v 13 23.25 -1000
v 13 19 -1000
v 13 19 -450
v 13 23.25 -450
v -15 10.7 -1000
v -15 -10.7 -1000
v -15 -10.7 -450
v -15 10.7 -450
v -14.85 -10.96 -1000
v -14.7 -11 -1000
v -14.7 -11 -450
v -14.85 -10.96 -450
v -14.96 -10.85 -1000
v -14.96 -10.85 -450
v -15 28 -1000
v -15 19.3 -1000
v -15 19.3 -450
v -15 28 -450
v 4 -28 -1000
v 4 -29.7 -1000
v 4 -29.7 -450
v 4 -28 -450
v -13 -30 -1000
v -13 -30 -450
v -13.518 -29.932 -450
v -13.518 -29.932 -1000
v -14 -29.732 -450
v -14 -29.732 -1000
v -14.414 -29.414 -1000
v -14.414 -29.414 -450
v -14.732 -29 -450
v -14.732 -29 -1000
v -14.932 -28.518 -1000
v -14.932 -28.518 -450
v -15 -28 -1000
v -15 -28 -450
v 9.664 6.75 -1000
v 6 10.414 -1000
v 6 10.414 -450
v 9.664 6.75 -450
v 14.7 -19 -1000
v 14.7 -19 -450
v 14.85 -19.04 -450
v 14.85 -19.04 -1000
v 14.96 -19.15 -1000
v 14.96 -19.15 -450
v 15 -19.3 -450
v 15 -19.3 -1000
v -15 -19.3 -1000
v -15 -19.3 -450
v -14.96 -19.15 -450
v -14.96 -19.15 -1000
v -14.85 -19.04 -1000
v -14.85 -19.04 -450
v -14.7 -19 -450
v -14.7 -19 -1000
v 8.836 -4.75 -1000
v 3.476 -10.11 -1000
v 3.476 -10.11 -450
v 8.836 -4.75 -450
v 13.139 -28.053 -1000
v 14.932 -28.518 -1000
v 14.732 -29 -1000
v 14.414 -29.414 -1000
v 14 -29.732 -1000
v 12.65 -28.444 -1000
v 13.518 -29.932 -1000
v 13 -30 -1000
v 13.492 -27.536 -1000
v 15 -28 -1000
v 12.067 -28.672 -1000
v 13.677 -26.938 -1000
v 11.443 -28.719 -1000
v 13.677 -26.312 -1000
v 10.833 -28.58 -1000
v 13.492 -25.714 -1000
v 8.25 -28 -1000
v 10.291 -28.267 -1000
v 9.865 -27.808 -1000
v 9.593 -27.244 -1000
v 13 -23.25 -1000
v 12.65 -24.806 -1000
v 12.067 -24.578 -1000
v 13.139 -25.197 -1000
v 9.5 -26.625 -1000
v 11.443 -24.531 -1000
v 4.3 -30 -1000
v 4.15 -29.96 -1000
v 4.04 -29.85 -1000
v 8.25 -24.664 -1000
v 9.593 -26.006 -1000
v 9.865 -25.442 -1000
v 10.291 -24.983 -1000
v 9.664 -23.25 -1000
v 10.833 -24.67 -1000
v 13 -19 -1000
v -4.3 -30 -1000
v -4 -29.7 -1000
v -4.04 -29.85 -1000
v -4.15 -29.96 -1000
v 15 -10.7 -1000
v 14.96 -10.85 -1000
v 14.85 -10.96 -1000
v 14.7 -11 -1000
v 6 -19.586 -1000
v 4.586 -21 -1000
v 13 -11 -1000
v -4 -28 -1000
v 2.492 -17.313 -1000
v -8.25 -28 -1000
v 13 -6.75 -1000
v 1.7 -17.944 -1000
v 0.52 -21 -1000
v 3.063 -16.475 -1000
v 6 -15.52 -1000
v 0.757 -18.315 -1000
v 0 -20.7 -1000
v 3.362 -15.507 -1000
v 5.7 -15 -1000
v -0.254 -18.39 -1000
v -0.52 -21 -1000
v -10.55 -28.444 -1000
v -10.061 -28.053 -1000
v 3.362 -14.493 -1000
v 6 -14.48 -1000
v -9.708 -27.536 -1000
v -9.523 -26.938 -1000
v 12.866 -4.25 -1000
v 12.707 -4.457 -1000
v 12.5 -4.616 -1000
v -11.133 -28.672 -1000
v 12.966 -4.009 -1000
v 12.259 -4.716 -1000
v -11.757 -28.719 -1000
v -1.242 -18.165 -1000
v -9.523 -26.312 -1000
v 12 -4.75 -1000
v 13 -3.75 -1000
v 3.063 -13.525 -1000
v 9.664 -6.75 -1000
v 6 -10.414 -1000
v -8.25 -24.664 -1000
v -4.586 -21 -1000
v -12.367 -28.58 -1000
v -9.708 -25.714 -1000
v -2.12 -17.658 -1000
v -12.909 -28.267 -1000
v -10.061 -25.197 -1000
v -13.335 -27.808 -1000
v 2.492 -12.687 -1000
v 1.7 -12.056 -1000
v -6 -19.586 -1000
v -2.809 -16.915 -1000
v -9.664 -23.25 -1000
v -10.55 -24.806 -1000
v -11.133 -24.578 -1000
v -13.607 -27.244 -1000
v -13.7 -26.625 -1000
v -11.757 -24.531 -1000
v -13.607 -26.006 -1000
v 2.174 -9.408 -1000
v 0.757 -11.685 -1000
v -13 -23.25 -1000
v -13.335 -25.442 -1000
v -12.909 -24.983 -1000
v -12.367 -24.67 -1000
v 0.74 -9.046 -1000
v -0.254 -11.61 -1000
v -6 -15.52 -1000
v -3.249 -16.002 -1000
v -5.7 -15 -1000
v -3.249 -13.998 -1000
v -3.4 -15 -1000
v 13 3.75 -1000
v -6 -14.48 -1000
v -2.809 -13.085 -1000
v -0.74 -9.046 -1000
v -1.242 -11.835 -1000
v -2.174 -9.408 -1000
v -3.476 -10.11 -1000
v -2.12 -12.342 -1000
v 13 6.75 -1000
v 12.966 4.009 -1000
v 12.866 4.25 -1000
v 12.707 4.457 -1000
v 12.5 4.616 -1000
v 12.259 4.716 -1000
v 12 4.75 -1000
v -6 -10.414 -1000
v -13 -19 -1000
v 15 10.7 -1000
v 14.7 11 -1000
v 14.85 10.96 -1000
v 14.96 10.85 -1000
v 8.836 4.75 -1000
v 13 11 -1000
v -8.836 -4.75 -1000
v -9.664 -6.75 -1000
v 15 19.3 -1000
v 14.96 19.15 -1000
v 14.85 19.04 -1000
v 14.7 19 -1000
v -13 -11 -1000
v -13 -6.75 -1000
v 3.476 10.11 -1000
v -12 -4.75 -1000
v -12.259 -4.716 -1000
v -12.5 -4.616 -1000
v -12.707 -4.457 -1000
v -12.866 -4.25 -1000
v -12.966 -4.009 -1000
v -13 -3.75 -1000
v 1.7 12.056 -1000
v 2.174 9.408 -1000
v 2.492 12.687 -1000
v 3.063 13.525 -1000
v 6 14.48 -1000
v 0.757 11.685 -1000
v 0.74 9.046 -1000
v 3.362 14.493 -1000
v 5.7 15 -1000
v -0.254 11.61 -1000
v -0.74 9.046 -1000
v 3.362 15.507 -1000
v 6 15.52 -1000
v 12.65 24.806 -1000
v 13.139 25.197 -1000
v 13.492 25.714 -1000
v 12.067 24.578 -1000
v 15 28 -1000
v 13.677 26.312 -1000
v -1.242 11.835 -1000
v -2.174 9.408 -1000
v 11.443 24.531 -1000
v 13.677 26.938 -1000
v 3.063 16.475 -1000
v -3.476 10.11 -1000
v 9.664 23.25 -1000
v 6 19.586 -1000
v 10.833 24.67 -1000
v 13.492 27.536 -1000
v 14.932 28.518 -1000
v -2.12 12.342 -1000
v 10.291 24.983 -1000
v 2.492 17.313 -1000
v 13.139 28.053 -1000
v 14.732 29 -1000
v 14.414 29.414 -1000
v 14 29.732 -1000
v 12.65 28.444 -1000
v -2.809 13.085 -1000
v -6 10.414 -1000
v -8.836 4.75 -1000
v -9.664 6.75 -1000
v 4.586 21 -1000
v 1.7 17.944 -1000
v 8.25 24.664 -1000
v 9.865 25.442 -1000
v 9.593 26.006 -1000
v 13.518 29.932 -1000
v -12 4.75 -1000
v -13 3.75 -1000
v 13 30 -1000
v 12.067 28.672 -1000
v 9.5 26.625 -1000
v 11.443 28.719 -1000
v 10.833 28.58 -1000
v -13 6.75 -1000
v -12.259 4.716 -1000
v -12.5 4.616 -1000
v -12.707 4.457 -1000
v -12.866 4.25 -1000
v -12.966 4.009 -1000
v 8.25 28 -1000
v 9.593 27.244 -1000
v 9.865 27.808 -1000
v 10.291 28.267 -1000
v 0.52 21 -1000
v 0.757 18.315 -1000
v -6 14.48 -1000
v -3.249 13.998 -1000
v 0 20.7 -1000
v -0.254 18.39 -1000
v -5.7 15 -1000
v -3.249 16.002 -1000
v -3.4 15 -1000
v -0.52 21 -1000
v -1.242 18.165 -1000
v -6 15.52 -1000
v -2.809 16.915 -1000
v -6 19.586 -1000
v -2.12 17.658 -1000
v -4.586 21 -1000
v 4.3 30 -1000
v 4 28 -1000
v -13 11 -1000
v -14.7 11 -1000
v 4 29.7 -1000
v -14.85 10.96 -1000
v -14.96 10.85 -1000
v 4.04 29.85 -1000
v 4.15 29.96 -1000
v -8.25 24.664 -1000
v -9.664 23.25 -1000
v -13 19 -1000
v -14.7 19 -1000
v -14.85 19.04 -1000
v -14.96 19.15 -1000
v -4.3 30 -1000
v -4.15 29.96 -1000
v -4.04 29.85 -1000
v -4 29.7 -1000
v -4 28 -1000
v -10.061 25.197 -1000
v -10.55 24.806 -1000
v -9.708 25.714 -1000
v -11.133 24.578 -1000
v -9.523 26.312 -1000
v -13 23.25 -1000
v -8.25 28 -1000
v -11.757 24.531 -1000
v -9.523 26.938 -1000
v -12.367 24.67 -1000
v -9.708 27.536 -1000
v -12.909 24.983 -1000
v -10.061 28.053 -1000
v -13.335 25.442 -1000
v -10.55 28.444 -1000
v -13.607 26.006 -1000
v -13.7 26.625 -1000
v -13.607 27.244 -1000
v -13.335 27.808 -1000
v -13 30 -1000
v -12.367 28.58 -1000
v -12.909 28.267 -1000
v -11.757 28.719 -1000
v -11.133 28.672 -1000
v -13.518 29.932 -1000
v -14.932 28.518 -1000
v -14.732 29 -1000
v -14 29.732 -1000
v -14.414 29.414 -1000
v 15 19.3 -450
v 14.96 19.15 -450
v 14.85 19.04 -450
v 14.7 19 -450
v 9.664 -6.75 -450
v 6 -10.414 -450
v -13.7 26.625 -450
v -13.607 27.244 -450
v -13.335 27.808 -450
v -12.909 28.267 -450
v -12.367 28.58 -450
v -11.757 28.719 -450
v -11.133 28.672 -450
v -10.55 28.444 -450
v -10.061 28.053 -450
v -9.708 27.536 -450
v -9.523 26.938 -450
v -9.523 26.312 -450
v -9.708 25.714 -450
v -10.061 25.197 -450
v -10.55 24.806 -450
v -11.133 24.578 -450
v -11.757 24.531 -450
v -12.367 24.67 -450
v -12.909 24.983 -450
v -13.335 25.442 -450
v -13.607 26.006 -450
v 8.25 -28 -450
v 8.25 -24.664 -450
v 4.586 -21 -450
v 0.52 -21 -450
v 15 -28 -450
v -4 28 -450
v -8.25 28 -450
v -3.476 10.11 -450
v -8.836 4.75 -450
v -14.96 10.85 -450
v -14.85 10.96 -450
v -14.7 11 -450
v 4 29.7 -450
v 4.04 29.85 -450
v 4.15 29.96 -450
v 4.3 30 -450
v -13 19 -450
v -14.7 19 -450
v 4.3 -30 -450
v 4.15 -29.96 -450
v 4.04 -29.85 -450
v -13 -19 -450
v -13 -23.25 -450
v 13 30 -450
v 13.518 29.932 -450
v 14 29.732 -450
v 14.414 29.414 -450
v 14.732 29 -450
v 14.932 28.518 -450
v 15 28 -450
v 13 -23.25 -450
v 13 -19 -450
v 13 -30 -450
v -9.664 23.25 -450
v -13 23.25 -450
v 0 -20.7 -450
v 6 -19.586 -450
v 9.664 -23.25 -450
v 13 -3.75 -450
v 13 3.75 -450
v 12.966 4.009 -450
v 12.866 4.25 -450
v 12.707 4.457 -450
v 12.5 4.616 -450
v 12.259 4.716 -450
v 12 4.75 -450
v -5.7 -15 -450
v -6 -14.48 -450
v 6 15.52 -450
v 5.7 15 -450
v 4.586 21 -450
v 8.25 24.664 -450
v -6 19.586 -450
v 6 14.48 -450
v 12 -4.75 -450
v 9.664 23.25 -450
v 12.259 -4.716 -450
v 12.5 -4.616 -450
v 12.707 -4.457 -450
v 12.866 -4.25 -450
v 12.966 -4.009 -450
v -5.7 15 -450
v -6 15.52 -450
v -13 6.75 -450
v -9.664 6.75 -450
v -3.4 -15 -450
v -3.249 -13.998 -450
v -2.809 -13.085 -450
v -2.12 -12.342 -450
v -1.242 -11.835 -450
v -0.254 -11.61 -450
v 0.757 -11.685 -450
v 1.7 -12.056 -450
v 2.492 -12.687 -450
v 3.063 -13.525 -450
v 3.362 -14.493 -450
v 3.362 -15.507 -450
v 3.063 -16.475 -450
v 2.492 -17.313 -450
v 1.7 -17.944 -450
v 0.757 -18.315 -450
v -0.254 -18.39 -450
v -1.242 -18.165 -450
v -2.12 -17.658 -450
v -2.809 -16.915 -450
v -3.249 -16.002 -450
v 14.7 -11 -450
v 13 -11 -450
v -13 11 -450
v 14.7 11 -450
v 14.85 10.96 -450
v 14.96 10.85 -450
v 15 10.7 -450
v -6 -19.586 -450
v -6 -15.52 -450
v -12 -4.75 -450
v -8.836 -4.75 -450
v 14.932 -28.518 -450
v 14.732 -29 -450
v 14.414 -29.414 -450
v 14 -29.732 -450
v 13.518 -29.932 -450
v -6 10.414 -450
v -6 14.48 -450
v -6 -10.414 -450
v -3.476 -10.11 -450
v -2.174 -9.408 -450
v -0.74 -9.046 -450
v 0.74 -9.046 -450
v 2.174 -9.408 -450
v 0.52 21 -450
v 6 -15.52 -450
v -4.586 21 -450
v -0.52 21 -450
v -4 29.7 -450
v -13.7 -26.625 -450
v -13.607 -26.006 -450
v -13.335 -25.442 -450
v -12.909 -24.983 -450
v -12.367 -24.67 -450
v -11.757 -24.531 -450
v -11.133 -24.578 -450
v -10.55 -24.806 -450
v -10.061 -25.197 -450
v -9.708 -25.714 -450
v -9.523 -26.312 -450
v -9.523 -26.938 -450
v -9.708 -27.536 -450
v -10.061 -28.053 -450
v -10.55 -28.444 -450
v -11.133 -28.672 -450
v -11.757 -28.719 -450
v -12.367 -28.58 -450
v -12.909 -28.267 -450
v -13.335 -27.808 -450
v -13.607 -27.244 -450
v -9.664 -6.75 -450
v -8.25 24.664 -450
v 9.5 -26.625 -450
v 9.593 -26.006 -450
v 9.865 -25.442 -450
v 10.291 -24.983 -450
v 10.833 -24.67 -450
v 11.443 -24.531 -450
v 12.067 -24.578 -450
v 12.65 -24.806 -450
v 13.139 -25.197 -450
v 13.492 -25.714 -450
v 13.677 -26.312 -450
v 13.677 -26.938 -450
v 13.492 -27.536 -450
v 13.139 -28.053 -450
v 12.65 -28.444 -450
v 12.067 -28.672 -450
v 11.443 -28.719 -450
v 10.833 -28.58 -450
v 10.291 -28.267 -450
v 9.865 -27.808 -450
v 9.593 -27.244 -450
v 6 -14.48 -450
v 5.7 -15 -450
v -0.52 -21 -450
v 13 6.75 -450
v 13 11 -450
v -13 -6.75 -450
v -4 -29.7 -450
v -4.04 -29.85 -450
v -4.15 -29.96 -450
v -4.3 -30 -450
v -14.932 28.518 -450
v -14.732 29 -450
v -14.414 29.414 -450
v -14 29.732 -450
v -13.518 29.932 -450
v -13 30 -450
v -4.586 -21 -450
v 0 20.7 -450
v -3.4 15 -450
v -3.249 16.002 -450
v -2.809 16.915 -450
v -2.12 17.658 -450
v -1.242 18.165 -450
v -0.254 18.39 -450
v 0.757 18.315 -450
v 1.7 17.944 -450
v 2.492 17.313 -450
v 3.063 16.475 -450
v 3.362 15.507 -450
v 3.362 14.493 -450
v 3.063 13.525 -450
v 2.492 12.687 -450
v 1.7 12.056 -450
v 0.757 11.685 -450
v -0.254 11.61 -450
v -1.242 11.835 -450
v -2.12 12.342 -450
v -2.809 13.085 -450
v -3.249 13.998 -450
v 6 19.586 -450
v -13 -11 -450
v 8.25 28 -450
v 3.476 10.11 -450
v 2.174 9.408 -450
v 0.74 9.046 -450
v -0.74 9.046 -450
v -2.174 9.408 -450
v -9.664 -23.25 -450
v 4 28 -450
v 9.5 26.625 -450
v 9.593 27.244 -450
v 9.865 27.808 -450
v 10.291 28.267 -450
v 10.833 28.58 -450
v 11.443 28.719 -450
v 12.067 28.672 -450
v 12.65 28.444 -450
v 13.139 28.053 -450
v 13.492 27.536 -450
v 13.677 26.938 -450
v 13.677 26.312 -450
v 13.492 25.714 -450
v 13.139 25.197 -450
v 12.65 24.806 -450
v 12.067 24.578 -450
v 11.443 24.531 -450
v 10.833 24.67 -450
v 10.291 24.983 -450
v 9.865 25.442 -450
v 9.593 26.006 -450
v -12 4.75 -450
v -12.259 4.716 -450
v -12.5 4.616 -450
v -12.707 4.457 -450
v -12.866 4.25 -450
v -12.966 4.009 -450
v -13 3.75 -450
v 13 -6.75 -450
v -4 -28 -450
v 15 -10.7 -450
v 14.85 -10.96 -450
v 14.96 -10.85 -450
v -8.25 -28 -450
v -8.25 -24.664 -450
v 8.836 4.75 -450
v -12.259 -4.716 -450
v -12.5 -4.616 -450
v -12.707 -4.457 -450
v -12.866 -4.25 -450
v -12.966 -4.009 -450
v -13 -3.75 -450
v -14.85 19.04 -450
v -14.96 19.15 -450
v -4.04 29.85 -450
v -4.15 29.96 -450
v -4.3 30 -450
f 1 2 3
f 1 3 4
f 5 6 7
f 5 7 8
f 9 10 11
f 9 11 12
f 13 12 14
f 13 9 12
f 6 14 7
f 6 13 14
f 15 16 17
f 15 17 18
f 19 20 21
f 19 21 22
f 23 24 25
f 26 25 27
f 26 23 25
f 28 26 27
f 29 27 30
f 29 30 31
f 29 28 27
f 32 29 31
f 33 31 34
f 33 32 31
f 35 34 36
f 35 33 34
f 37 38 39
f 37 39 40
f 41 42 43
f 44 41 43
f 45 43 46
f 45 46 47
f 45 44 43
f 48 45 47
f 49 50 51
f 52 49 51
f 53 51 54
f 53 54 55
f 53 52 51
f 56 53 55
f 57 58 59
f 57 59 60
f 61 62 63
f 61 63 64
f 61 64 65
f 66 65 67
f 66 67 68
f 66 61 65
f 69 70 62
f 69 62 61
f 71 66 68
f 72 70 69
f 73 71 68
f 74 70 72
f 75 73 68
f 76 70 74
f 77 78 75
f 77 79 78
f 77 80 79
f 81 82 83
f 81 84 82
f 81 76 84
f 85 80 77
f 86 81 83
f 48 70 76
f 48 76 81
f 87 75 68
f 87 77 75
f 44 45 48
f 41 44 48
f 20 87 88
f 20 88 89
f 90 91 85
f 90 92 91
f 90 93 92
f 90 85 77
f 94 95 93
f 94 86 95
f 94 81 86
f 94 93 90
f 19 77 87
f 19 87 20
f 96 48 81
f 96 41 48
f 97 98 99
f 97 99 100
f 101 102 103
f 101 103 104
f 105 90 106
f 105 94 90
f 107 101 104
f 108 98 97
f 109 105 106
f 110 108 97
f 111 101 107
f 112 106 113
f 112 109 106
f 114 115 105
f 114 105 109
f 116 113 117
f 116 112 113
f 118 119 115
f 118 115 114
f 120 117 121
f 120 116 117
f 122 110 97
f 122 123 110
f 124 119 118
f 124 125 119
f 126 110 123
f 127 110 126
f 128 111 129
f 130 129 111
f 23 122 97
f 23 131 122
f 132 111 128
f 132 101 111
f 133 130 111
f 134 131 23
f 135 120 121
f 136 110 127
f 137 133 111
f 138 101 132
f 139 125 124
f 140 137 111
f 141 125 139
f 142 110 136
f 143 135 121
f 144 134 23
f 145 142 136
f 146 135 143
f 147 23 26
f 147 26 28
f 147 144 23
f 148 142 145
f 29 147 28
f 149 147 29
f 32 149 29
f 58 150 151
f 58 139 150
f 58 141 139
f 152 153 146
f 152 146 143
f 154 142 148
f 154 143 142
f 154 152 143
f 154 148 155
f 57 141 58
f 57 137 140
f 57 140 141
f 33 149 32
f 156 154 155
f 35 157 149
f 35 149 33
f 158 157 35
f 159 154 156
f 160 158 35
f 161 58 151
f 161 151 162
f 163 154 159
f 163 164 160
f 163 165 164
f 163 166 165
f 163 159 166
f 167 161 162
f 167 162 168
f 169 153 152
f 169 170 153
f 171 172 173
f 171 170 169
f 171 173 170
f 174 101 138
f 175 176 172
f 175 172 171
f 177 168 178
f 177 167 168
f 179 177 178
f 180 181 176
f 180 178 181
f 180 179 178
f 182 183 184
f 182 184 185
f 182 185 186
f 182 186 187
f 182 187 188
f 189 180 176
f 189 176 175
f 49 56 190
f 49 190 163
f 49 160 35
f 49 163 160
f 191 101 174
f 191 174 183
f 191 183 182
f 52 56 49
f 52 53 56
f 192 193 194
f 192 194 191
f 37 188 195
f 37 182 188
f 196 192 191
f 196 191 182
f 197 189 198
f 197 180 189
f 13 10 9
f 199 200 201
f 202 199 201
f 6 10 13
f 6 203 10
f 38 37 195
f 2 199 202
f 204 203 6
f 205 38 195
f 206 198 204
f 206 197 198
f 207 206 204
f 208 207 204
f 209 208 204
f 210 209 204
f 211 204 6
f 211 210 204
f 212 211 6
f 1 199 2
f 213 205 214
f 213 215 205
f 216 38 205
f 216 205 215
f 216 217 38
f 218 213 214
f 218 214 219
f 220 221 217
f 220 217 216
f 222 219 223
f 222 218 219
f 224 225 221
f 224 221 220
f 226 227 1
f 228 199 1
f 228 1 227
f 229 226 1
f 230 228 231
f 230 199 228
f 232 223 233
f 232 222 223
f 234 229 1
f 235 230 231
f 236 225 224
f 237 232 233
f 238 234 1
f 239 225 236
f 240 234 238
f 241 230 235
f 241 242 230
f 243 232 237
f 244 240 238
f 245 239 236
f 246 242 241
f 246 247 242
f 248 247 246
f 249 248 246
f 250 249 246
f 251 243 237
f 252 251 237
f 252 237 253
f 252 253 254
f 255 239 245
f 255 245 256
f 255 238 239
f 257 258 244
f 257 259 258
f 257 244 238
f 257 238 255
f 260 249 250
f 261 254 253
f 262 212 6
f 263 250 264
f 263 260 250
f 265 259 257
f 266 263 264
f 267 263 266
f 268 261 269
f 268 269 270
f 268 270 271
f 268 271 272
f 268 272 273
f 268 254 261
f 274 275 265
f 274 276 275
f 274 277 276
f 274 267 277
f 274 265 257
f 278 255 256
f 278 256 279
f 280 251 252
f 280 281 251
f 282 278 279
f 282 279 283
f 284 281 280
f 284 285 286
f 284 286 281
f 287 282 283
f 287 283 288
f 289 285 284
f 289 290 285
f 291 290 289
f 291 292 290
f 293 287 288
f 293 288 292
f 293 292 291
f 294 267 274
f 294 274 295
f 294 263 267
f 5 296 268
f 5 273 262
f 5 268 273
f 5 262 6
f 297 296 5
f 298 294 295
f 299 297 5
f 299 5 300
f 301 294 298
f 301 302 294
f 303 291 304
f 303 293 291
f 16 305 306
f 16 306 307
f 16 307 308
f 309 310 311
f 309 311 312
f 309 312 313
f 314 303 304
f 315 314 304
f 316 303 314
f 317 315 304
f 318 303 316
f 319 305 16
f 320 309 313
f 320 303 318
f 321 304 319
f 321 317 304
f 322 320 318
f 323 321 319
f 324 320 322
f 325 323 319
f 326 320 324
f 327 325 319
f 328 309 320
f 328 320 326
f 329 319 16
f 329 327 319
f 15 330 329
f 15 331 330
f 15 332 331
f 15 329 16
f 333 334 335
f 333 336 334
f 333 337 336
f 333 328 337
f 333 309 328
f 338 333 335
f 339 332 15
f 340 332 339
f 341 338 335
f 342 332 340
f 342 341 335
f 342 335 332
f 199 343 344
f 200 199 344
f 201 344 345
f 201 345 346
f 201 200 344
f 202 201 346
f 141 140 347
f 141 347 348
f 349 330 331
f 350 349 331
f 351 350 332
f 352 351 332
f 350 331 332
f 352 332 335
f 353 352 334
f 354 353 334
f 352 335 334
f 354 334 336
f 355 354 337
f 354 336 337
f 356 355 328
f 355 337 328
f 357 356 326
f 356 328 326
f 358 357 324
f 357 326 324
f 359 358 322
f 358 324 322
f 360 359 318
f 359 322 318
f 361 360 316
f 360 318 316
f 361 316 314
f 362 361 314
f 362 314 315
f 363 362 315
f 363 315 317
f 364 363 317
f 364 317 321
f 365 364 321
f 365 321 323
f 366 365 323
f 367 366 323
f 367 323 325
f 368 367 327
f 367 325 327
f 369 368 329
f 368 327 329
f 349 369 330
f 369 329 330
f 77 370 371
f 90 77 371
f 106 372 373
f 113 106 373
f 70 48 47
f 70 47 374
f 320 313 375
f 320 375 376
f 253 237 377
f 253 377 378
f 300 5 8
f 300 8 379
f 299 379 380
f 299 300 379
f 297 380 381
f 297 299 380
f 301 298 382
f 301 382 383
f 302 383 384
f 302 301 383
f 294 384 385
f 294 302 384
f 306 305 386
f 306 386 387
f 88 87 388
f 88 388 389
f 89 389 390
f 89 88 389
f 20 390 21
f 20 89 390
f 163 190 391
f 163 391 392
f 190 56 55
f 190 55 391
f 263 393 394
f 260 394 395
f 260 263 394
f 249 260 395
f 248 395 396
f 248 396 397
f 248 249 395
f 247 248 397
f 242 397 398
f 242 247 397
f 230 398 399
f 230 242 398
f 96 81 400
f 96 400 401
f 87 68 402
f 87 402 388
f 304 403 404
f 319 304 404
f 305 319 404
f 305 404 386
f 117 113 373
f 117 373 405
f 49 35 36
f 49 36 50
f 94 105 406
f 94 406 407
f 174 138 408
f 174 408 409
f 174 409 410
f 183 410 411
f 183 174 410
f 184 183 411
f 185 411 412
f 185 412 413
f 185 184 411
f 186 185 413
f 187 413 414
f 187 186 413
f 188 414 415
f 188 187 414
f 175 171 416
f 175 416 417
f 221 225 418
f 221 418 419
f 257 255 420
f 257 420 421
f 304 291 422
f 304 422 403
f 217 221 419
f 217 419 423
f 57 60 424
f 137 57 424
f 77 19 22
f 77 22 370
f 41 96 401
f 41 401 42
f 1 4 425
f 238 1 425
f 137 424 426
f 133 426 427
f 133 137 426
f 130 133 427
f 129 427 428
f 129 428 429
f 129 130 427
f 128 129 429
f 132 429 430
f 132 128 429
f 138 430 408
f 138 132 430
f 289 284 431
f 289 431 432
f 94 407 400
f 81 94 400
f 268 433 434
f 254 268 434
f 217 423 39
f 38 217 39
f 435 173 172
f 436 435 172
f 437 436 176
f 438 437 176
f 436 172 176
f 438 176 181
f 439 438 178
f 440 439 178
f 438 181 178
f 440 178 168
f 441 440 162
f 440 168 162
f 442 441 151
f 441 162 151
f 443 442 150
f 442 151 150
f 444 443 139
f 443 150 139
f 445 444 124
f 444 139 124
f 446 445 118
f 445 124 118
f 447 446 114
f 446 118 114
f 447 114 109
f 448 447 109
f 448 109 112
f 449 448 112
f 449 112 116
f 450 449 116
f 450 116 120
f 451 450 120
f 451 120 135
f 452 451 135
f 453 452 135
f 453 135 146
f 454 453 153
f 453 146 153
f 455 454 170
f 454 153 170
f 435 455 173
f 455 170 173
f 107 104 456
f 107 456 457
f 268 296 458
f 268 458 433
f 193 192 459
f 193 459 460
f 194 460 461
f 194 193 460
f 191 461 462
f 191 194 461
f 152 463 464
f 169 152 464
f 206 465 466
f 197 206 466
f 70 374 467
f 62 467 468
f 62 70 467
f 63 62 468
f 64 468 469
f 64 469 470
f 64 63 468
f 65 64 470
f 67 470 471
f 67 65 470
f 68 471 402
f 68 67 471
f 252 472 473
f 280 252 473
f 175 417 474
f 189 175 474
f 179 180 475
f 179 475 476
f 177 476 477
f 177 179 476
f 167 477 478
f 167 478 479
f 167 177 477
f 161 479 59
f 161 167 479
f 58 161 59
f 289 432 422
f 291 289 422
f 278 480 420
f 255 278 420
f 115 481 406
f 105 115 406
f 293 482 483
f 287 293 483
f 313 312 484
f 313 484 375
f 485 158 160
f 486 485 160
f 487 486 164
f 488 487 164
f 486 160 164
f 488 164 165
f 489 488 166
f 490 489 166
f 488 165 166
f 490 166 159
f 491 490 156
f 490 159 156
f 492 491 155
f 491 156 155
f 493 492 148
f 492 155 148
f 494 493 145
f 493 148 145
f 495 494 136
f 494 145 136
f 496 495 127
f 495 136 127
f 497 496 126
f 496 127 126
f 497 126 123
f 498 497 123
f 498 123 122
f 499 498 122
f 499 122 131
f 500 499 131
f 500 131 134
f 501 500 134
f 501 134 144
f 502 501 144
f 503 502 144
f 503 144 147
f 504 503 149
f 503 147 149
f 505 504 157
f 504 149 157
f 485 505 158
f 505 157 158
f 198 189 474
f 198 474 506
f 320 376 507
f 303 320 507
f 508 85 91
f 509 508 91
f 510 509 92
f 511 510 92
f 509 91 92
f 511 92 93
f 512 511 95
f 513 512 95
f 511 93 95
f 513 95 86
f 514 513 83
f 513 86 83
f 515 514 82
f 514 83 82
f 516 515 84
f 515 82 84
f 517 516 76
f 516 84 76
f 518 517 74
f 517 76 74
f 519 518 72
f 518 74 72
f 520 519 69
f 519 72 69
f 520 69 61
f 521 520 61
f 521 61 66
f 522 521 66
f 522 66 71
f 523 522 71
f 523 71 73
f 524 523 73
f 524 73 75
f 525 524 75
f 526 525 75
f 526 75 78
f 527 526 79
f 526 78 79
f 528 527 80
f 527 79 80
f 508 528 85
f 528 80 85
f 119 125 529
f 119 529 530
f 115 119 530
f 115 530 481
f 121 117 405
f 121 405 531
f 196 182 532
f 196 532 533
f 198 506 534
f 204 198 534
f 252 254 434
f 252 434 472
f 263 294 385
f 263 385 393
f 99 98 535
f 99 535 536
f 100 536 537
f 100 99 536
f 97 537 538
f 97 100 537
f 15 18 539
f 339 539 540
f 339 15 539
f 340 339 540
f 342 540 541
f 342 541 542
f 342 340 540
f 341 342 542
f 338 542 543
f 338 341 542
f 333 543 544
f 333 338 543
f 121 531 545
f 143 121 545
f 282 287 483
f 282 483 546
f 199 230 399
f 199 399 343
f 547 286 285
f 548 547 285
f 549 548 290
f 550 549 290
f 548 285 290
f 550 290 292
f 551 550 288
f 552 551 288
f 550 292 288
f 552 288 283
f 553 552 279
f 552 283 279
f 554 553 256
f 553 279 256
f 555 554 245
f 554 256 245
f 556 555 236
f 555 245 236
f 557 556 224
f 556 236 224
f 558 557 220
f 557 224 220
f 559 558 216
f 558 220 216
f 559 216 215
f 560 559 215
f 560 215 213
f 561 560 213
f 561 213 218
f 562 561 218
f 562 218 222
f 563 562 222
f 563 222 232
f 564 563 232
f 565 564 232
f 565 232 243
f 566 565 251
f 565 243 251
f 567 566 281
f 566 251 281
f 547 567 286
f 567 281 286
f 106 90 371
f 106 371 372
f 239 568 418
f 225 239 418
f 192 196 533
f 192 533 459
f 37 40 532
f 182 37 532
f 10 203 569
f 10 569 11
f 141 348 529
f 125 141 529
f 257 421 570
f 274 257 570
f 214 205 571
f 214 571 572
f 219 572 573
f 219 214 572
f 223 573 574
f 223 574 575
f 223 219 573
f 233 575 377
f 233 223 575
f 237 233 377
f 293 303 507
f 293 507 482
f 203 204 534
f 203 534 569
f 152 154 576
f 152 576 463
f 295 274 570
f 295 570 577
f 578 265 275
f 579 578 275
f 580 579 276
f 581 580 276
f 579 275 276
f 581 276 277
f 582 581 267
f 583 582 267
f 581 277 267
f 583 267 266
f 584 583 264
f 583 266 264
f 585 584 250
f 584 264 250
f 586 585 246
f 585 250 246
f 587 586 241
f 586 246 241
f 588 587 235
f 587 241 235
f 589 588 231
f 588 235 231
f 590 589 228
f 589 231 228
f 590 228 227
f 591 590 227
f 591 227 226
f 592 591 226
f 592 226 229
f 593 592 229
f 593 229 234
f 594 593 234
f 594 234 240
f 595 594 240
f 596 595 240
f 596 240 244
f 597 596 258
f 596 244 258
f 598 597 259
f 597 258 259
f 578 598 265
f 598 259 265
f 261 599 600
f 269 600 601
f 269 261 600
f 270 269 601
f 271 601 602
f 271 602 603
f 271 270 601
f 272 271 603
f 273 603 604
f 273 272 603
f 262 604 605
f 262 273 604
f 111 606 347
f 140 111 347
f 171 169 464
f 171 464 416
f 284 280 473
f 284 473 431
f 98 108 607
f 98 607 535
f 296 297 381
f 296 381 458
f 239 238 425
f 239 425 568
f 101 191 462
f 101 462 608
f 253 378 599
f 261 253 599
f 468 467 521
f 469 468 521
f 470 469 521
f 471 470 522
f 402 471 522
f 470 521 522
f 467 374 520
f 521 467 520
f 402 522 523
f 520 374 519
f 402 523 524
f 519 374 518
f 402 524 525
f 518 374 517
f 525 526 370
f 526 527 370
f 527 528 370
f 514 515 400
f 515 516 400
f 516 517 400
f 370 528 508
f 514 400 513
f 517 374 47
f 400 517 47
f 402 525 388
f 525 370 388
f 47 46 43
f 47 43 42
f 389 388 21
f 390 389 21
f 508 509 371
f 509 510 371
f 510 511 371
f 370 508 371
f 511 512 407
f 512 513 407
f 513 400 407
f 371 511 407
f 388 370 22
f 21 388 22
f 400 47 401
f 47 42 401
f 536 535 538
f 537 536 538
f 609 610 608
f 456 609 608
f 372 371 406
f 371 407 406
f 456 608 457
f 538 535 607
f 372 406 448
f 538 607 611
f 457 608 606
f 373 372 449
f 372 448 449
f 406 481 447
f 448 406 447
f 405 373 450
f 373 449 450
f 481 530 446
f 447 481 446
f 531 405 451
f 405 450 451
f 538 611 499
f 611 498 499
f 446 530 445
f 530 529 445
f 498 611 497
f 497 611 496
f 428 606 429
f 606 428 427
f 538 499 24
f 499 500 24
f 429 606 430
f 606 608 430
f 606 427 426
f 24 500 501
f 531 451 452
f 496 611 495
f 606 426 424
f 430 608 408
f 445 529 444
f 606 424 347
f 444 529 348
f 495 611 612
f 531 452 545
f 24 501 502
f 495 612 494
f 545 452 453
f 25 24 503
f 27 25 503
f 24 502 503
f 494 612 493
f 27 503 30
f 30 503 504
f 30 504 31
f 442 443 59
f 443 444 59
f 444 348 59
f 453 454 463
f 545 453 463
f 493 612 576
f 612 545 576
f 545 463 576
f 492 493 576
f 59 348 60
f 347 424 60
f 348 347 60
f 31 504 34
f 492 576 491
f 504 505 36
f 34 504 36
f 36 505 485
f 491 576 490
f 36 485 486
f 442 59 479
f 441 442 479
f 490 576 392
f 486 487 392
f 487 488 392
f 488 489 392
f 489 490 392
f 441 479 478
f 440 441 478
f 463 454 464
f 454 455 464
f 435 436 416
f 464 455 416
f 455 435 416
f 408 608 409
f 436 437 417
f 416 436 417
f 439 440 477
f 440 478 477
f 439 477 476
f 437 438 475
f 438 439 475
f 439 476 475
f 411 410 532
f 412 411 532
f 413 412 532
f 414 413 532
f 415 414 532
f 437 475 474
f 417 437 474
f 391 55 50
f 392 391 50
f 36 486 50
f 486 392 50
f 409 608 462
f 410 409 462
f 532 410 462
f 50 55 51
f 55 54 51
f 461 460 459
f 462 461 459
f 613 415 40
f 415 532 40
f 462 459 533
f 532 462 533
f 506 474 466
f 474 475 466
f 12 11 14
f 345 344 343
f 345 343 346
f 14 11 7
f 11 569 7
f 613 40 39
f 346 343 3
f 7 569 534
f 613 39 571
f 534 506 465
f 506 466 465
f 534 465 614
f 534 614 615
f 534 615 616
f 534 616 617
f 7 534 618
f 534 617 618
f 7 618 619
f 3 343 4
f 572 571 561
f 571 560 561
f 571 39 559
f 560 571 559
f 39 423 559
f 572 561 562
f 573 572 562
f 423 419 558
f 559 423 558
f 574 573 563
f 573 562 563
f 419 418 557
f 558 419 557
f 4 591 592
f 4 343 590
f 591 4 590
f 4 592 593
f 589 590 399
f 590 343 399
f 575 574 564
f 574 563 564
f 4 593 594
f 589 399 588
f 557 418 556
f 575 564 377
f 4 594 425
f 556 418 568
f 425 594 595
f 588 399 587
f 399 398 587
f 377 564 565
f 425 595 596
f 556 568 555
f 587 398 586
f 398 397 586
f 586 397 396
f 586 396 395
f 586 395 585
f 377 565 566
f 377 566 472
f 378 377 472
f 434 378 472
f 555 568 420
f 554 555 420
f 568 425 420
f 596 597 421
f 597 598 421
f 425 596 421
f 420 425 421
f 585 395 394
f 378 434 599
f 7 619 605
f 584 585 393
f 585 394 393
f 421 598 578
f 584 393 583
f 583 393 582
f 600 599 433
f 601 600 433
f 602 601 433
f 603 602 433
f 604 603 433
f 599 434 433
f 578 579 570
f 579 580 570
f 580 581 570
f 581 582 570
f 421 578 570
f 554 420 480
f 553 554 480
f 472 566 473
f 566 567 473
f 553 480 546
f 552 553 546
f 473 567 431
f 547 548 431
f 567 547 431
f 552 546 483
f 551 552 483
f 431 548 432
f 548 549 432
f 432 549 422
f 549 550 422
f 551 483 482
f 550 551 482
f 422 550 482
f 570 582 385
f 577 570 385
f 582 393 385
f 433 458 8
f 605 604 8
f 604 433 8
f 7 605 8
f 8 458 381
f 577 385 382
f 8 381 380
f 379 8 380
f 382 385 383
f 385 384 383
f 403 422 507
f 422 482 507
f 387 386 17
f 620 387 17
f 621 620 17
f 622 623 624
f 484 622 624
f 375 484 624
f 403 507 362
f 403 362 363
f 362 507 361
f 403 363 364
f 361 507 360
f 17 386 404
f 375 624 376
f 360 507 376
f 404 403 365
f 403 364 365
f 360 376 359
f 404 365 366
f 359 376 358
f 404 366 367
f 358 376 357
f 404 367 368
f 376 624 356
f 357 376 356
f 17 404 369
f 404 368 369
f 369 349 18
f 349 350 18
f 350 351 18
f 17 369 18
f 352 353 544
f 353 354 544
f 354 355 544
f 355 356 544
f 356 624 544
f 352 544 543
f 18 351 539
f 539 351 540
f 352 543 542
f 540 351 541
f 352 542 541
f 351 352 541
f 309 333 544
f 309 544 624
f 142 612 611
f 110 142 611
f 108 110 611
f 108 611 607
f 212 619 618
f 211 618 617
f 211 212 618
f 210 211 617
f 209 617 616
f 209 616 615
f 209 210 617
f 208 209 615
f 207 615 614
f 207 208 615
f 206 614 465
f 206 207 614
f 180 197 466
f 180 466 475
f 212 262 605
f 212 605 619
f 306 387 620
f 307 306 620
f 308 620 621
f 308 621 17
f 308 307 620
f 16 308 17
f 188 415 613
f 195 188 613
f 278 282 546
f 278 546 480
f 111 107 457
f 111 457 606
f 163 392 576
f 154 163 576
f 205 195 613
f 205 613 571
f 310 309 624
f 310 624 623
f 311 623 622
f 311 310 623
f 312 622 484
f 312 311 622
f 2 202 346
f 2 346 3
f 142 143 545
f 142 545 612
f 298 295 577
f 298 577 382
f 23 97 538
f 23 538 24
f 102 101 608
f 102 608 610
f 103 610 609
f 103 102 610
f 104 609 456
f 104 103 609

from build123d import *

# Parameters (mm, degrees)
SKETCH1_R           = 2.1
SKETCH1_R_2         = 3.4
BOSS_EXTRUDE1_DEPTH = 550


with BuildPart() as part:
    # Sketch1 → Boss-Extrude1 (new body)
    with BuildSketch(Plane(origin=(0, 0, -1000), x_dir=(-1, 0, 0), z_dir=(0, 0, -1))):
        with BuildLine():
            Line((15, -28), (15, -19.3))
            ThreePointArc((15, -19.3), (14.912132034, -19.087867966), (14.7, -19))
            Line((14.7, -19), (13, -19))
            Line((13, -19), (13, -23.25))
            Line((13, -23.25), (9.6642, -23.25))
            Line((9.6642, -23.25), (6, -19.5858))
            Line((6, -19.5858), (6, -15.519615242))
            Line((6, -15.519615242), (5.7, -15))
            Line((5.7, -15), (6, -14.480384758))
            Line((6, -14.480384758), (6, -10.4142))
            Line((6, -10.4142), (9.6642, -6.75))
            Line((9.6642, -6.75), (13, -6.75))
            Line((13, -6.75), (13, -11))
            Line((13, -11), (14.7, -11))
            ThreePointArc((14.7, -11), (14.912132034, -10.912132034), (15, -10.7))
            Line((15, -10.7), (15, 10.7))
            ThreePointArc((15, 10.7), (14.912132034, 10.912132034), (14.7, 11))
            Line((14.7, 11), (13, 11))
            Line((13, 11), (13, 6.75))
            Line((13, 6.75), (9.6642, 6.75))
            Line((9.6642, 6.75), (6, 10.4142))
            Line((6, 10.4142), (6, 14.480384758))
            Line((6, 14.480384758), (5.7, 15))
            Line((5.7, 15), (6, 15.519615242))
            Line((6, 15.519615242), (6, 19.5858))
            Line((6, 19.5858), (9.6642, 23.25))
            Line((9.6642, 23.25), (13, 23.25))
            Line((13, 23.25), (13, 19))
            Line((13, 19), (14.7, 19))
            ThreePointArc((14.7, 19), (14.912132034, 19.087867966), (15, 19.3))
            Line((15, 19.3), (15, 28))
            ThreePointArc((15, 28), (14.414213562, 29.414213562), (13, 30))
            Line((13, 30), (4.3, 30))
            ThreePointArc((4.3, 30), (4.087867966, 29.912132034), (4, 29.7))
            Line((4, 29.7), (4, 28))
            Line((4, 28), (8.25, 28))
            Line((8.25, 28), (8.25, 24.6642))
            Line((8.25, 24.6642), (4.5858, 21))
            Line((4.5858, 21), (0.519615242, 21))
            Line((0.519615242, 21), (0, 20.7))
            Line((0, 20.7), (-0.519615242, 21))
            Line((-0.519615242, 21), (-4.5858, 21))
            Line((-4.5858, 21), (-8.25, 24.6642))
            Line((-8.25, 24.6642), (-8.25, 28))
            Line((-8.25, 28), (-4, 28))
            Line((-4, 28), (-4, 29.7))
            ThreePointArc((-4, 29.7), (-4.087867966, 29.912132034), (-4.3, 30))
            Line((-4.3, 30), (-13, 30))
            ThreePointArc((-13, 30), (-14.414213562, 29.414213562), (-15, 28))
            Line((-15, 28), (-15, 19.3))
            ThreePointArc((-15, 19.3), (-14.912132034, 19.087867966), (-14.7, 19))
            Line((-14.7, 19), (-13, 19))
            Line((-13, 19), (-13, 23.25))
            Line((-13, 23.25), (-9.6642, 23.25))
            Line((-9.6642, 23.25), (-6, 19.5858))
            Line((-6, 19.5858), (-6, 15.519615242))
            Line((-6, 15.519615242), (-5.7, 15))
            Line((-5.7, 15), (-6, 14.480384758))
            Line((-6, 14.480384758), (-6, 10.4142))
            Line((-6, 10.4142), (-9.6642, 6.75))
            Line((-9.6642, 6.75), (-13, 6.75))
            Line((-13, 6.75), (-13, 11))
            Line((-13, 11), (-14.7, 11))
            ThreePointArc((-14.7, 11), (-14.912132034, 10.912132034), (-15, 10.7))
            Line((-15, 10.7), (-15, -10.7))
            ThreePointArc((-15, -10.7), (-14.912132034, -10.912132034), (-14.7, -11))
            Line((-14.7, -11), (-13, -11))
            Line((-13, -11), (-13, -6.75))
            Line((-13, -6.75), (-9.6642, -6.75))
            Line((-9.6642, -6.75), (-6, -10.4142))
            Line((-6, -10.4142), (-6, -14.480384758))
            Line((-6, -14.480384758), (-5.7, -15))
            Line((-5.7, -15), (-6, -15.519615242))
            Line((-6, -15.519615242), (-6, -19.5858))
            Line((-6, -19.5858), (-9.6642, -23.25))
            Line((-9.6642, -23.25), (-13, -23.25))
            Line((-13, -23.25), (-13, -19))
            Line((-13, -19), (-14.7, -19))
            ThreePointArc((-14.7, -19), (-14.912132034, -19.087867966), (-15, -19.3))
            Line((-15, -19.3), (-15, -28))
            ThreePointArc((-15, -28), (-14.414213562, -29.414213562), (-13, -30))
            Line((-13, -30), (-4.3, -30))
            ThreePointArc((-4.3, -30), (-4.087867966, -29.912132034), (-4, -29.7))
            Line((-4, -29.7), (-4, -28))
            Line((-4, -28), (-8.25, -28))
            Line((-8.25, -28), (-8.25, -24.6642))
            Line((-8.25, -24.6642), (-4.5858, -21))
            Line((-4.5858, -21), (-0.519615242, -21))
            Line((-0.519615242, -21), (0, -20.7))
            Line((0, -20.7), (0.519615242, -21))
            Line((0.519615242, -21), (4.5858, -21))
            Line((4.5858, -21), (8.25, -24.6642))
            Line((8.25, -24.6642), (8.25, -28))
            Line((8.25, -28), (4, -28))
            Line((4, -28), (4, -29.7))
            ThreePointArc((4, -29.7), (4.087867966, -29.912132034), (4.3, -30))
            Line((4.3, -30), (13, -30))
            ThreePointArc((13, -30), (14.414213562, -29.414213562), (15, -28))
        make_face()
        with Locations((11.6, 26.625)):
            Circle(SKETCH1_R, mode=Mode.SUBTRACT)
        with Locations((11.6, -26.625)):
            Circle(SKETCH1_R, mode=Mode.SUBTRACT)
        with Locations((0, -15)):
            Circle(SKETCH1_R_2, mode=Mode.SUBTRACT)
        with Locations((0, 15)):
            Circle(SKETCH1_R_2, mode=Mode.SUBTRACT)
        with Locations((-11.6, 26.625)):
            Circle(SKETCH1_R, mode=Mode.SUBTRACT)
        with Locations((-11.6, -26.625)):
            Circle(SKETCH1_R, mode=Mode.SUBTRACT)
        with BuildLine():
            Line((13, 3.75), (13, -3.75))
            ThreePointArc((13, -3.75), (12.707106781, -4.457106781), (12, -4.75))
            Line((12, -4.75), (8.8358, -4.75))
            Line((8.8358, -4.75), (3.476201279, -10.109598721))
            ThreePointArc((3.476201279, -10.109598721), (0, -9), (-3.476201279, -10.109598721))
            Line((-3.476201279, -10.109598721), (-8.8358, -4.75))
            Line((-8.8358, -4.75), (-12, -4.75))
            ThreePointArc((-12, -4.75), (-12.707106781, -4.457106781), (-13, -3.75))
            Line((-13, -3.75), (-13, 3.75))
            ThreePointArc((-13, 3.75), (-12.707106781, 4.457106781), (-12, 4.75))
            Line((-12, 4.75), (-8.8358, 4.75))
            Line((-8.8358, 4.75), (-3.476201279, 10.109598721))
            ThreePointArc((-3.476201279, 10.109598721), (0, 9), (3.476201279, 10.109598721))
            Line((3.476201279, 10.109598721), (8.8358, 4.75))
            Line((8.8358, 4.75), (12, 4.75))
            ThreePointArc((12, 4.75), (12.707106781, 4.457106781), (13, 3.75))
        make_face(mode=Mode.SUBTRACT)
    extrude(amount=-BOSS_EXTRUDE1_DEPTH)


solid = part.part
